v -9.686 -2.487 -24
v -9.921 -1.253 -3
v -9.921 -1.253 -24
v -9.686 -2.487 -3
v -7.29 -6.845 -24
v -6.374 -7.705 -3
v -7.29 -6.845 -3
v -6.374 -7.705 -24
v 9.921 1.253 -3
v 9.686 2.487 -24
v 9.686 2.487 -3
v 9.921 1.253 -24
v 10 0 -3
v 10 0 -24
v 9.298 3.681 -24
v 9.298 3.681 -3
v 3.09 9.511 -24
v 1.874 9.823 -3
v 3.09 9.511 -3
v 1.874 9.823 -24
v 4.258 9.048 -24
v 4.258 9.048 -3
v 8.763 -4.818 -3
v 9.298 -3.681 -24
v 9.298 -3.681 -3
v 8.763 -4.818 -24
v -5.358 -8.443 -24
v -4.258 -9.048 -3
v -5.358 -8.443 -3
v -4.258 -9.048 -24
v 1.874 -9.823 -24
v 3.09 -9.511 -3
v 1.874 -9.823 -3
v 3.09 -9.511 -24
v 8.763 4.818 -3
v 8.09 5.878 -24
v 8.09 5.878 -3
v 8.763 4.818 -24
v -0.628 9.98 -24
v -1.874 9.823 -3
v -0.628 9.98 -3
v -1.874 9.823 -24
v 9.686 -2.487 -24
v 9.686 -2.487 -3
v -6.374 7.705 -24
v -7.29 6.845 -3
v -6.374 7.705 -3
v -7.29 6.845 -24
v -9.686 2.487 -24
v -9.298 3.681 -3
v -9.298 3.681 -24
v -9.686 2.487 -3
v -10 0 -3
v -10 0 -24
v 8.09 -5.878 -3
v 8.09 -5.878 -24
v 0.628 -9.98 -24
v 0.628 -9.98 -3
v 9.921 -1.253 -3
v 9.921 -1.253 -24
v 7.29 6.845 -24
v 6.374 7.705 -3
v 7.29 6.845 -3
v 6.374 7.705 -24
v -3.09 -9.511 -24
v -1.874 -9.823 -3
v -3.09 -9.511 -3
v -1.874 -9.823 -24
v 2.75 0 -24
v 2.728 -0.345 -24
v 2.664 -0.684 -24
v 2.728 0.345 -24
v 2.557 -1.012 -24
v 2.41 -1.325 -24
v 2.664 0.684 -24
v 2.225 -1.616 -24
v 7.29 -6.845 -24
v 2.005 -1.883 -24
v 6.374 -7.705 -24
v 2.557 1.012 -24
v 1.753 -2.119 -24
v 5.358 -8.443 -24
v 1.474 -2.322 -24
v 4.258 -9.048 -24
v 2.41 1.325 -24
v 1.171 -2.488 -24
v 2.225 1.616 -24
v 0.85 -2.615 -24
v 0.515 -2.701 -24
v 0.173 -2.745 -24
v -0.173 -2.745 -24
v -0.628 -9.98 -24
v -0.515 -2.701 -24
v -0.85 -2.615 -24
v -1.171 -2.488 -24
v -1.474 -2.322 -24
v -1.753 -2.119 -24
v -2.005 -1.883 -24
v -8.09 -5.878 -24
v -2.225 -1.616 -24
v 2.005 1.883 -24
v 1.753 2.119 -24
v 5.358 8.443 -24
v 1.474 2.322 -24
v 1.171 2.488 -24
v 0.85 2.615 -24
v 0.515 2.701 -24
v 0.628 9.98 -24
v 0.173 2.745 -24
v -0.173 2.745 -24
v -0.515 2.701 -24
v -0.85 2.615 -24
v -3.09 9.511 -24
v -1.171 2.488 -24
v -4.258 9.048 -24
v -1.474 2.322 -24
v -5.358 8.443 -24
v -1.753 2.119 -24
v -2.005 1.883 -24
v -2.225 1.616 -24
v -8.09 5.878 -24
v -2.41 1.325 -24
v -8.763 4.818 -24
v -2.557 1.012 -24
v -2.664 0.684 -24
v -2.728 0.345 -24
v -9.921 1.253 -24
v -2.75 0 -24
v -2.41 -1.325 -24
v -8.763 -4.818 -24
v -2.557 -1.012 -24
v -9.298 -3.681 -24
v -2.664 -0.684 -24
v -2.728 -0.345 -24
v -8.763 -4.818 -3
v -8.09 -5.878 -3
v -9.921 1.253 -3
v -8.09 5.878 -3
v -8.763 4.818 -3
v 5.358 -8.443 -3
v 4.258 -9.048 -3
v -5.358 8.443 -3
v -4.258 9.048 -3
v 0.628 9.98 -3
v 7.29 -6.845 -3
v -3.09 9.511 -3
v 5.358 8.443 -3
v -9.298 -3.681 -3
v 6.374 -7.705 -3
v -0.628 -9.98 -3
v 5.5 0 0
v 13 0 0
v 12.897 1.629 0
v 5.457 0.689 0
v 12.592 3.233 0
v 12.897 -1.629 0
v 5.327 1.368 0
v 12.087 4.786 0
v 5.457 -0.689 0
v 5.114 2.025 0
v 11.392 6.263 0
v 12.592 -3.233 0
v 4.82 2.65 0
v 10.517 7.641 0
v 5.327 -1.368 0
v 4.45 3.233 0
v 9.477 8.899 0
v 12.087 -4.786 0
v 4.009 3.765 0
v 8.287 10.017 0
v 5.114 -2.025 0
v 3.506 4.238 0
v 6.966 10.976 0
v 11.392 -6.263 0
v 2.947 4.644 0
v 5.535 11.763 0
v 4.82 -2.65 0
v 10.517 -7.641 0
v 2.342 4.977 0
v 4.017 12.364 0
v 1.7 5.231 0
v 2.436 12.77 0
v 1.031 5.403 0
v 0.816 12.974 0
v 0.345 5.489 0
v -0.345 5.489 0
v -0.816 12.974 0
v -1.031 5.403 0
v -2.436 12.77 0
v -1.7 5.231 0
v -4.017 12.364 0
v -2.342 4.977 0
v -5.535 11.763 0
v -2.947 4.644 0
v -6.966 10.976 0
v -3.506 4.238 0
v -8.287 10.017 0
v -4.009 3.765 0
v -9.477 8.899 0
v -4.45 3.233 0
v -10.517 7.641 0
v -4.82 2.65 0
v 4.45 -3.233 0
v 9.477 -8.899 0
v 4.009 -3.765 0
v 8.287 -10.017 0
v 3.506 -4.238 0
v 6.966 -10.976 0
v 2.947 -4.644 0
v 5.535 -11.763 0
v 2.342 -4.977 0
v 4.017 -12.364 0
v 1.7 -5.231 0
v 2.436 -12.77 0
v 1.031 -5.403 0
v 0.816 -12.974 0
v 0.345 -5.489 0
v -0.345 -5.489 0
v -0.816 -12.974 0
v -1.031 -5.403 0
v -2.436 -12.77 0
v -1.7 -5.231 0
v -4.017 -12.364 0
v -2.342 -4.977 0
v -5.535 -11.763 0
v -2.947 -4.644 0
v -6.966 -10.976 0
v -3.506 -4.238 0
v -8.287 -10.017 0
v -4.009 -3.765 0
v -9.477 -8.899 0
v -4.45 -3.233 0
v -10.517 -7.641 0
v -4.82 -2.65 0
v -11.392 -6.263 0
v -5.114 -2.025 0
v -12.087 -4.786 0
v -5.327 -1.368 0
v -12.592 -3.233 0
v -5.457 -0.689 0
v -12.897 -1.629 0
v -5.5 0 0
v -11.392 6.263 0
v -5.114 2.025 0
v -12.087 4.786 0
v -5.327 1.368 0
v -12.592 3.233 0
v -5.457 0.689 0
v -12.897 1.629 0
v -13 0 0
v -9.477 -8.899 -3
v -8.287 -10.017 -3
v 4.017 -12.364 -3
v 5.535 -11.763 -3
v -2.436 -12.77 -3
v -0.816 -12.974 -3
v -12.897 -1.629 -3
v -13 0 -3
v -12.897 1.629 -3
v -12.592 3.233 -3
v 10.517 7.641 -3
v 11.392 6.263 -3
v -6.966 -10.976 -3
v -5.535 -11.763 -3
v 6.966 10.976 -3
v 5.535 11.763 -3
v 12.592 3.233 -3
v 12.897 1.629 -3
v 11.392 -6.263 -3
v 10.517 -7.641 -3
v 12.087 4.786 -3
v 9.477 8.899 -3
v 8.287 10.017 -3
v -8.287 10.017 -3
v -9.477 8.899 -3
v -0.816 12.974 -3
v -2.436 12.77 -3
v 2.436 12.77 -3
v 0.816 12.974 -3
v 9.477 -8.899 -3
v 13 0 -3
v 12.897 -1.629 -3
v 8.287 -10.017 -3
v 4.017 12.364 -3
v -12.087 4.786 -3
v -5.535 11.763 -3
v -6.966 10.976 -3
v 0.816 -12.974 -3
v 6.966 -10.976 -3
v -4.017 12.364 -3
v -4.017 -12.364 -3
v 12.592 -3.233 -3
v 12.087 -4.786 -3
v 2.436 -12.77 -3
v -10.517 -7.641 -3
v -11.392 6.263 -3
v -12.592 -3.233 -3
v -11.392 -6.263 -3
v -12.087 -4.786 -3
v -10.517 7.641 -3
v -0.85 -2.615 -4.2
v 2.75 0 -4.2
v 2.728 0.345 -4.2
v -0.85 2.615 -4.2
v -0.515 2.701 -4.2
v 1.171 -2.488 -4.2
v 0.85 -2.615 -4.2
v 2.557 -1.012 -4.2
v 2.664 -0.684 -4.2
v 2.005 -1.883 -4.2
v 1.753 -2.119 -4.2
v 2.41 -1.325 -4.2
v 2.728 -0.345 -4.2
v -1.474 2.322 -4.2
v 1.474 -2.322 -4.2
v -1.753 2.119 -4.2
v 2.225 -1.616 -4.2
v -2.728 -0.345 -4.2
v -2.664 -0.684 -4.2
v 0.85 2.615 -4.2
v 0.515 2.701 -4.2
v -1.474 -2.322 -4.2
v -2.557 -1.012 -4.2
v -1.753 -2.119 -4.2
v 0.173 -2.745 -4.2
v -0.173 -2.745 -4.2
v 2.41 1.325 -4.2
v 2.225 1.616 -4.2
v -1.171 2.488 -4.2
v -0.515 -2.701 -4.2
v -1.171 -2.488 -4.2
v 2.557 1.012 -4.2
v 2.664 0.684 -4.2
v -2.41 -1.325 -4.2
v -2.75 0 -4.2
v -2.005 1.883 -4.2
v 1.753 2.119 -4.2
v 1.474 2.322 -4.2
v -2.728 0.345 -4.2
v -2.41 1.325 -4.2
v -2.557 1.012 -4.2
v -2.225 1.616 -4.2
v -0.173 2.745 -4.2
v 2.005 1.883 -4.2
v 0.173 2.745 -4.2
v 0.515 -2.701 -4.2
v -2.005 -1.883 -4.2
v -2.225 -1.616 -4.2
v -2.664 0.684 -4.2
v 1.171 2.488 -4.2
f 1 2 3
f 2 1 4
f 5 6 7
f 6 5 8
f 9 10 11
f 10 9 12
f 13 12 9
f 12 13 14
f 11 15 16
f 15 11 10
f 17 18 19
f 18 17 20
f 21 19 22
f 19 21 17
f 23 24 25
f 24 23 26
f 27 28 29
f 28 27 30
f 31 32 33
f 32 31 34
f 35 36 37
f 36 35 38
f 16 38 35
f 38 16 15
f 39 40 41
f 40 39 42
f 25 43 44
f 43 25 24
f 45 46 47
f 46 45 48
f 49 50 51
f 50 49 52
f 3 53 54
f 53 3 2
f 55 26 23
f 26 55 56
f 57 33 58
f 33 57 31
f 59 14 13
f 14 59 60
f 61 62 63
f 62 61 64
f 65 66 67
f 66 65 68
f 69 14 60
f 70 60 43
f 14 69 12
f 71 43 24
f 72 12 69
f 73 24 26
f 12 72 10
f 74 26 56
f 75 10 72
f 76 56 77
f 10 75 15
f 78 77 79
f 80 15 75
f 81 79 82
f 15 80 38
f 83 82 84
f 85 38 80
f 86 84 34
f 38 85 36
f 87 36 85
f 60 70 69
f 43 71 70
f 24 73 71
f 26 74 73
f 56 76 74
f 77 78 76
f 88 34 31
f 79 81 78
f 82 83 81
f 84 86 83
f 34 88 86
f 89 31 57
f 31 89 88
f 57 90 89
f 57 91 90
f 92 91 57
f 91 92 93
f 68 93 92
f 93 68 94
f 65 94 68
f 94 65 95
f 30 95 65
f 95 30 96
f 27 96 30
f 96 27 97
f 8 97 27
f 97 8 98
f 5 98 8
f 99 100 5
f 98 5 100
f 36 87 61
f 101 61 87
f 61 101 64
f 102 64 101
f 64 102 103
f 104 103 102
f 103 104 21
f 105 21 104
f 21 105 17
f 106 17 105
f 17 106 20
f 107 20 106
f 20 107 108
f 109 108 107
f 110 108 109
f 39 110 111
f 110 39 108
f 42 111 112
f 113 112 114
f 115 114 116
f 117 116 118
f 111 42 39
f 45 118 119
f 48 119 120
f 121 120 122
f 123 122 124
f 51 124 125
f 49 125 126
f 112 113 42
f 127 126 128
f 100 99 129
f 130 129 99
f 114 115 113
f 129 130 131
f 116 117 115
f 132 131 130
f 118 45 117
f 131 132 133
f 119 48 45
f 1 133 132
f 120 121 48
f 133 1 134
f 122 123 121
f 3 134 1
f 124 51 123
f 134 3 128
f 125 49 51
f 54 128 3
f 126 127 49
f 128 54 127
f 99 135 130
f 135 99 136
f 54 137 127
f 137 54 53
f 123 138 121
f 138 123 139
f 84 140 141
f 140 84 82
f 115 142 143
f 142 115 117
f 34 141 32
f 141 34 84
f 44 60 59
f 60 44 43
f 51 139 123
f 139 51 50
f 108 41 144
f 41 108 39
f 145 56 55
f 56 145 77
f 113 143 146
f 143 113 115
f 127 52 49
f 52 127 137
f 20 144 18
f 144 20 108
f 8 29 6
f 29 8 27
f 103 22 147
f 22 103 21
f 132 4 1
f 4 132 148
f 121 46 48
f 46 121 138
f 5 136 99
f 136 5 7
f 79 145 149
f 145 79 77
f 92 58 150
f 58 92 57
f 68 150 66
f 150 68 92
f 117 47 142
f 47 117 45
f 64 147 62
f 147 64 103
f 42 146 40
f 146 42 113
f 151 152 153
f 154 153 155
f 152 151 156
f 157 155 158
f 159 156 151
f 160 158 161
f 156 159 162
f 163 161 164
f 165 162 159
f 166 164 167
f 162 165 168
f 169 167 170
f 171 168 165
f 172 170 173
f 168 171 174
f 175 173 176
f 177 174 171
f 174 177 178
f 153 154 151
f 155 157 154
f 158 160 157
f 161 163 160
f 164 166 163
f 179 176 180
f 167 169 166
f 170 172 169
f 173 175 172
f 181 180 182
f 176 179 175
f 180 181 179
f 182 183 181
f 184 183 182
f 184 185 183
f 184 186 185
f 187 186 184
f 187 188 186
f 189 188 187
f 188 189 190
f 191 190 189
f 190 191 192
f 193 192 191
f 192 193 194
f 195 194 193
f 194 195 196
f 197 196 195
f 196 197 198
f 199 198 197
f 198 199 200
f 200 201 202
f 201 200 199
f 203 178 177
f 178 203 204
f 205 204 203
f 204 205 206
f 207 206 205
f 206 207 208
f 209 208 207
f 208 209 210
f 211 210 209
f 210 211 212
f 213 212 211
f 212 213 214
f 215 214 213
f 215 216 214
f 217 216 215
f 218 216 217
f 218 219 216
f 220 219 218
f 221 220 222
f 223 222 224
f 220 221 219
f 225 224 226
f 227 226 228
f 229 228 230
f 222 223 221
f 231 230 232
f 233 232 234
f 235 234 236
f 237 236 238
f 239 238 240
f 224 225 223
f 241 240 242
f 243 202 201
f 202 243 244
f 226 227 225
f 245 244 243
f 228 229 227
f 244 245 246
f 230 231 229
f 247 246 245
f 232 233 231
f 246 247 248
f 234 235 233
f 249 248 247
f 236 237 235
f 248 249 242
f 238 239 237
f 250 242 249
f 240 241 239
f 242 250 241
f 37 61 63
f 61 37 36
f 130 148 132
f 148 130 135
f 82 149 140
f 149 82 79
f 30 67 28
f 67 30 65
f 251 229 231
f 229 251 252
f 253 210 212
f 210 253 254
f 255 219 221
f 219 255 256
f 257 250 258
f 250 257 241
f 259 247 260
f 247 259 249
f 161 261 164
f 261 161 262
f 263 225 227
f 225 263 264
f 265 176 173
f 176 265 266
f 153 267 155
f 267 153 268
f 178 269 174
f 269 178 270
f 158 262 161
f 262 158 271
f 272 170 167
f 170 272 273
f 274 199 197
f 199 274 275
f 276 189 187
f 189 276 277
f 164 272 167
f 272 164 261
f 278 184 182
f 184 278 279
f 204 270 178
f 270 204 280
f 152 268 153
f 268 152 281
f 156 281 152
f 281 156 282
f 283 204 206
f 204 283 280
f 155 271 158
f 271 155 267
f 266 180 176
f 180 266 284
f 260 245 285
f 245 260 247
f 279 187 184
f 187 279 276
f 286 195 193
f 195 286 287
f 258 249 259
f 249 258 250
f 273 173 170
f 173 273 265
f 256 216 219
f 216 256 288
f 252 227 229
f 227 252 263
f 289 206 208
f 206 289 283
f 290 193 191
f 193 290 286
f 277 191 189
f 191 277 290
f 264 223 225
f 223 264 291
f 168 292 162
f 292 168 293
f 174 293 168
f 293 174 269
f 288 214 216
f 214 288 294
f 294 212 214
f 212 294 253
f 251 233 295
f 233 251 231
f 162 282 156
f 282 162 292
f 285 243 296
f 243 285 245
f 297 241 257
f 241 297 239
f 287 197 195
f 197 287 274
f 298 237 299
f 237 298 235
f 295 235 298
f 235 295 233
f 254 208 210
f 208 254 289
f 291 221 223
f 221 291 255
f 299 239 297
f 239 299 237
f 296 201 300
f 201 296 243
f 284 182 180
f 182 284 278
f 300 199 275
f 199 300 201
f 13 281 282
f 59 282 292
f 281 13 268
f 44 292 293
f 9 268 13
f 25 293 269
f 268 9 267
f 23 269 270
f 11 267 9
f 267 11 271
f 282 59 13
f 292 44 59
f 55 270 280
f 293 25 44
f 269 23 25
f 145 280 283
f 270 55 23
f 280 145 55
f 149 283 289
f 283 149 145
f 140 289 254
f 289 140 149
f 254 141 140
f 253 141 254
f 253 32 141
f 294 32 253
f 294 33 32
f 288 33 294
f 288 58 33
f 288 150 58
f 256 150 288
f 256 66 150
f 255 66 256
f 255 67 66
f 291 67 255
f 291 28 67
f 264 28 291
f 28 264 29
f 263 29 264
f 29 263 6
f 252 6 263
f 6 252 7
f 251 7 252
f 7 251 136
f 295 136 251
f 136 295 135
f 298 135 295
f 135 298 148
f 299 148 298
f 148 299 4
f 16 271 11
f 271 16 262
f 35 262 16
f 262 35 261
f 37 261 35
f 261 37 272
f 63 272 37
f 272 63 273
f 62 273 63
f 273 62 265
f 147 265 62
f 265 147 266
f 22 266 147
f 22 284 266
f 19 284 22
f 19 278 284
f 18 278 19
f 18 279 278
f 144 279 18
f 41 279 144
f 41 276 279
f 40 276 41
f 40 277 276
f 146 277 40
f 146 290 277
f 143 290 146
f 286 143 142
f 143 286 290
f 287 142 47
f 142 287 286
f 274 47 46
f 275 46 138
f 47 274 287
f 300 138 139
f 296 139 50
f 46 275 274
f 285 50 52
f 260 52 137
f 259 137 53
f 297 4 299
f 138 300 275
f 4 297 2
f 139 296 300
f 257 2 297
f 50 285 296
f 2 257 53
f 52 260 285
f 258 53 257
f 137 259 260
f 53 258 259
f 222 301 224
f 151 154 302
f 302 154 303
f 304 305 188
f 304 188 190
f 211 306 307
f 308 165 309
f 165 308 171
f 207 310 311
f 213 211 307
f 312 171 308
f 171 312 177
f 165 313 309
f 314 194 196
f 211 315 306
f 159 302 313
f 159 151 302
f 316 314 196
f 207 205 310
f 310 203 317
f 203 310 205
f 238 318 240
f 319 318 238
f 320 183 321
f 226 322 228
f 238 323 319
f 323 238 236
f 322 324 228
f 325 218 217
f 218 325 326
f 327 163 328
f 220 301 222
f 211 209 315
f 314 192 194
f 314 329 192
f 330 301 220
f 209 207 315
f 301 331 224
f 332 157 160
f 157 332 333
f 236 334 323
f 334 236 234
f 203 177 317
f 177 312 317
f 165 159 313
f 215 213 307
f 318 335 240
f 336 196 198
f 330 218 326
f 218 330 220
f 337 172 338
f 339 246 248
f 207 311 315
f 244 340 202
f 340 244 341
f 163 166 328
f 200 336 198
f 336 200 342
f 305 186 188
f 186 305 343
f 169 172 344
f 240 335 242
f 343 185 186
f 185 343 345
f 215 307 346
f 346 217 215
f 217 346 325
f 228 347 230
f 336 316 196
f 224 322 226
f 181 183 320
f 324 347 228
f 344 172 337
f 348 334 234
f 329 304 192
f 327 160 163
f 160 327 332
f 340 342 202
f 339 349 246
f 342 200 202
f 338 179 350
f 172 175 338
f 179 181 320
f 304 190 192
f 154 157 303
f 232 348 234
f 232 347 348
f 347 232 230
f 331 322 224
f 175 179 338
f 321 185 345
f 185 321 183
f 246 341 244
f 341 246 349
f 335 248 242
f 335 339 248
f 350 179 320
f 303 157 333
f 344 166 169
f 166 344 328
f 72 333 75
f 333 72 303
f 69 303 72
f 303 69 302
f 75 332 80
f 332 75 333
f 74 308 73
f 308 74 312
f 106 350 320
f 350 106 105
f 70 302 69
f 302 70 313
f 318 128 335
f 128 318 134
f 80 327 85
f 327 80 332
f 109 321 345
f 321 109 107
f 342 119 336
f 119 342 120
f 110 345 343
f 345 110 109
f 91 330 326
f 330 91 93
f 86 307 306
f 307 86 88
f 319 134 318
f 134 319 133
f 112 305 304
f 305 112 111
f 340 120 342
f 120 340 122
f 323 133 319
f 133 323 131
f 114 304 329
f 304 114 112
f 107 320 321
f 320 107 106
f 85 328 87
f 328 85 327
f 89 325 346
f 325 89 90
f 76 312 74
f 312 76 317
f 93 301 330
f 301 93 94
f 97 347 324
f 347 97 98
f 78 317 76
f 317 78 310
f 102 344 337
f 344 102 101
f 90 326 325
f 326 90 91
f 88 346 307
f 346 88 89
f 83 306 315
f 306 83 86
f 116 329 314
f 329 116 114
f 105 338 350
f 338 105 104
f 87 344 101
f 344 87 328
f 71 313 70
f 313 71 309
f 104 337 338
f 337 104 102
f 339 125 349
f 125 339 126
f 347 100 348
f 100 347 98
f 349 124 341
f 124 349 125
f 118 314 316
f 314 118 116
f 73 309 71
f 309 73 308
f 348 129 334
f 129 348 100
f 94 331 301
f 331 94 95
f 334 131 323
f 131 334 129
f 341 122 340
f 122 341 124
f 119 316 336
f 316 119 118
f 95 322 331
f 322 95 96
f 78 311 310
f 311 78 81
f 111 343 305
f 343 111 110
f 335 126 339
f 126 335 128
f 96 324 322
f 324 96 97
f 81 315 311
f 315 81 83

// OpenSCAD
$fn = 50;


difference() {
	union() {
		translate(v = [0, 0, -24.0000000000]) {
			cylinder(h = 24, r = 10.0000000000);
		}
		translate(v = [0, 0, -3.0000000000]) {
			cylinder(h = 3, r = 13.0000000000);
		}
	}
	union() {
		translate(v = [0, 0, 0]) {
			rotate(a = [0, 0, 0]) {
				difference() {
					union() {
						#translate(v = [0, 0, -24.0000000000]) {
							cylinder(h = 24, r = 2.2500000000);
						}
						#translate(v = [0, 0, -4.2000000000]) {
							cylinder(h = 4.2000000000, r1 = 2.7500000000, r2 = 5.5000000000);
						}
						#translate(v = [0, 0, -24.0000000000]) {
							cylinder(h = 24, r = 2.7500000000);
						}
						#translate(v = [0, 0, -24.0000000000]) {
							cylinder(h = 24, r = 2.2500000000);
						}
					}
					union();
				}
			}
		}
	}
}
